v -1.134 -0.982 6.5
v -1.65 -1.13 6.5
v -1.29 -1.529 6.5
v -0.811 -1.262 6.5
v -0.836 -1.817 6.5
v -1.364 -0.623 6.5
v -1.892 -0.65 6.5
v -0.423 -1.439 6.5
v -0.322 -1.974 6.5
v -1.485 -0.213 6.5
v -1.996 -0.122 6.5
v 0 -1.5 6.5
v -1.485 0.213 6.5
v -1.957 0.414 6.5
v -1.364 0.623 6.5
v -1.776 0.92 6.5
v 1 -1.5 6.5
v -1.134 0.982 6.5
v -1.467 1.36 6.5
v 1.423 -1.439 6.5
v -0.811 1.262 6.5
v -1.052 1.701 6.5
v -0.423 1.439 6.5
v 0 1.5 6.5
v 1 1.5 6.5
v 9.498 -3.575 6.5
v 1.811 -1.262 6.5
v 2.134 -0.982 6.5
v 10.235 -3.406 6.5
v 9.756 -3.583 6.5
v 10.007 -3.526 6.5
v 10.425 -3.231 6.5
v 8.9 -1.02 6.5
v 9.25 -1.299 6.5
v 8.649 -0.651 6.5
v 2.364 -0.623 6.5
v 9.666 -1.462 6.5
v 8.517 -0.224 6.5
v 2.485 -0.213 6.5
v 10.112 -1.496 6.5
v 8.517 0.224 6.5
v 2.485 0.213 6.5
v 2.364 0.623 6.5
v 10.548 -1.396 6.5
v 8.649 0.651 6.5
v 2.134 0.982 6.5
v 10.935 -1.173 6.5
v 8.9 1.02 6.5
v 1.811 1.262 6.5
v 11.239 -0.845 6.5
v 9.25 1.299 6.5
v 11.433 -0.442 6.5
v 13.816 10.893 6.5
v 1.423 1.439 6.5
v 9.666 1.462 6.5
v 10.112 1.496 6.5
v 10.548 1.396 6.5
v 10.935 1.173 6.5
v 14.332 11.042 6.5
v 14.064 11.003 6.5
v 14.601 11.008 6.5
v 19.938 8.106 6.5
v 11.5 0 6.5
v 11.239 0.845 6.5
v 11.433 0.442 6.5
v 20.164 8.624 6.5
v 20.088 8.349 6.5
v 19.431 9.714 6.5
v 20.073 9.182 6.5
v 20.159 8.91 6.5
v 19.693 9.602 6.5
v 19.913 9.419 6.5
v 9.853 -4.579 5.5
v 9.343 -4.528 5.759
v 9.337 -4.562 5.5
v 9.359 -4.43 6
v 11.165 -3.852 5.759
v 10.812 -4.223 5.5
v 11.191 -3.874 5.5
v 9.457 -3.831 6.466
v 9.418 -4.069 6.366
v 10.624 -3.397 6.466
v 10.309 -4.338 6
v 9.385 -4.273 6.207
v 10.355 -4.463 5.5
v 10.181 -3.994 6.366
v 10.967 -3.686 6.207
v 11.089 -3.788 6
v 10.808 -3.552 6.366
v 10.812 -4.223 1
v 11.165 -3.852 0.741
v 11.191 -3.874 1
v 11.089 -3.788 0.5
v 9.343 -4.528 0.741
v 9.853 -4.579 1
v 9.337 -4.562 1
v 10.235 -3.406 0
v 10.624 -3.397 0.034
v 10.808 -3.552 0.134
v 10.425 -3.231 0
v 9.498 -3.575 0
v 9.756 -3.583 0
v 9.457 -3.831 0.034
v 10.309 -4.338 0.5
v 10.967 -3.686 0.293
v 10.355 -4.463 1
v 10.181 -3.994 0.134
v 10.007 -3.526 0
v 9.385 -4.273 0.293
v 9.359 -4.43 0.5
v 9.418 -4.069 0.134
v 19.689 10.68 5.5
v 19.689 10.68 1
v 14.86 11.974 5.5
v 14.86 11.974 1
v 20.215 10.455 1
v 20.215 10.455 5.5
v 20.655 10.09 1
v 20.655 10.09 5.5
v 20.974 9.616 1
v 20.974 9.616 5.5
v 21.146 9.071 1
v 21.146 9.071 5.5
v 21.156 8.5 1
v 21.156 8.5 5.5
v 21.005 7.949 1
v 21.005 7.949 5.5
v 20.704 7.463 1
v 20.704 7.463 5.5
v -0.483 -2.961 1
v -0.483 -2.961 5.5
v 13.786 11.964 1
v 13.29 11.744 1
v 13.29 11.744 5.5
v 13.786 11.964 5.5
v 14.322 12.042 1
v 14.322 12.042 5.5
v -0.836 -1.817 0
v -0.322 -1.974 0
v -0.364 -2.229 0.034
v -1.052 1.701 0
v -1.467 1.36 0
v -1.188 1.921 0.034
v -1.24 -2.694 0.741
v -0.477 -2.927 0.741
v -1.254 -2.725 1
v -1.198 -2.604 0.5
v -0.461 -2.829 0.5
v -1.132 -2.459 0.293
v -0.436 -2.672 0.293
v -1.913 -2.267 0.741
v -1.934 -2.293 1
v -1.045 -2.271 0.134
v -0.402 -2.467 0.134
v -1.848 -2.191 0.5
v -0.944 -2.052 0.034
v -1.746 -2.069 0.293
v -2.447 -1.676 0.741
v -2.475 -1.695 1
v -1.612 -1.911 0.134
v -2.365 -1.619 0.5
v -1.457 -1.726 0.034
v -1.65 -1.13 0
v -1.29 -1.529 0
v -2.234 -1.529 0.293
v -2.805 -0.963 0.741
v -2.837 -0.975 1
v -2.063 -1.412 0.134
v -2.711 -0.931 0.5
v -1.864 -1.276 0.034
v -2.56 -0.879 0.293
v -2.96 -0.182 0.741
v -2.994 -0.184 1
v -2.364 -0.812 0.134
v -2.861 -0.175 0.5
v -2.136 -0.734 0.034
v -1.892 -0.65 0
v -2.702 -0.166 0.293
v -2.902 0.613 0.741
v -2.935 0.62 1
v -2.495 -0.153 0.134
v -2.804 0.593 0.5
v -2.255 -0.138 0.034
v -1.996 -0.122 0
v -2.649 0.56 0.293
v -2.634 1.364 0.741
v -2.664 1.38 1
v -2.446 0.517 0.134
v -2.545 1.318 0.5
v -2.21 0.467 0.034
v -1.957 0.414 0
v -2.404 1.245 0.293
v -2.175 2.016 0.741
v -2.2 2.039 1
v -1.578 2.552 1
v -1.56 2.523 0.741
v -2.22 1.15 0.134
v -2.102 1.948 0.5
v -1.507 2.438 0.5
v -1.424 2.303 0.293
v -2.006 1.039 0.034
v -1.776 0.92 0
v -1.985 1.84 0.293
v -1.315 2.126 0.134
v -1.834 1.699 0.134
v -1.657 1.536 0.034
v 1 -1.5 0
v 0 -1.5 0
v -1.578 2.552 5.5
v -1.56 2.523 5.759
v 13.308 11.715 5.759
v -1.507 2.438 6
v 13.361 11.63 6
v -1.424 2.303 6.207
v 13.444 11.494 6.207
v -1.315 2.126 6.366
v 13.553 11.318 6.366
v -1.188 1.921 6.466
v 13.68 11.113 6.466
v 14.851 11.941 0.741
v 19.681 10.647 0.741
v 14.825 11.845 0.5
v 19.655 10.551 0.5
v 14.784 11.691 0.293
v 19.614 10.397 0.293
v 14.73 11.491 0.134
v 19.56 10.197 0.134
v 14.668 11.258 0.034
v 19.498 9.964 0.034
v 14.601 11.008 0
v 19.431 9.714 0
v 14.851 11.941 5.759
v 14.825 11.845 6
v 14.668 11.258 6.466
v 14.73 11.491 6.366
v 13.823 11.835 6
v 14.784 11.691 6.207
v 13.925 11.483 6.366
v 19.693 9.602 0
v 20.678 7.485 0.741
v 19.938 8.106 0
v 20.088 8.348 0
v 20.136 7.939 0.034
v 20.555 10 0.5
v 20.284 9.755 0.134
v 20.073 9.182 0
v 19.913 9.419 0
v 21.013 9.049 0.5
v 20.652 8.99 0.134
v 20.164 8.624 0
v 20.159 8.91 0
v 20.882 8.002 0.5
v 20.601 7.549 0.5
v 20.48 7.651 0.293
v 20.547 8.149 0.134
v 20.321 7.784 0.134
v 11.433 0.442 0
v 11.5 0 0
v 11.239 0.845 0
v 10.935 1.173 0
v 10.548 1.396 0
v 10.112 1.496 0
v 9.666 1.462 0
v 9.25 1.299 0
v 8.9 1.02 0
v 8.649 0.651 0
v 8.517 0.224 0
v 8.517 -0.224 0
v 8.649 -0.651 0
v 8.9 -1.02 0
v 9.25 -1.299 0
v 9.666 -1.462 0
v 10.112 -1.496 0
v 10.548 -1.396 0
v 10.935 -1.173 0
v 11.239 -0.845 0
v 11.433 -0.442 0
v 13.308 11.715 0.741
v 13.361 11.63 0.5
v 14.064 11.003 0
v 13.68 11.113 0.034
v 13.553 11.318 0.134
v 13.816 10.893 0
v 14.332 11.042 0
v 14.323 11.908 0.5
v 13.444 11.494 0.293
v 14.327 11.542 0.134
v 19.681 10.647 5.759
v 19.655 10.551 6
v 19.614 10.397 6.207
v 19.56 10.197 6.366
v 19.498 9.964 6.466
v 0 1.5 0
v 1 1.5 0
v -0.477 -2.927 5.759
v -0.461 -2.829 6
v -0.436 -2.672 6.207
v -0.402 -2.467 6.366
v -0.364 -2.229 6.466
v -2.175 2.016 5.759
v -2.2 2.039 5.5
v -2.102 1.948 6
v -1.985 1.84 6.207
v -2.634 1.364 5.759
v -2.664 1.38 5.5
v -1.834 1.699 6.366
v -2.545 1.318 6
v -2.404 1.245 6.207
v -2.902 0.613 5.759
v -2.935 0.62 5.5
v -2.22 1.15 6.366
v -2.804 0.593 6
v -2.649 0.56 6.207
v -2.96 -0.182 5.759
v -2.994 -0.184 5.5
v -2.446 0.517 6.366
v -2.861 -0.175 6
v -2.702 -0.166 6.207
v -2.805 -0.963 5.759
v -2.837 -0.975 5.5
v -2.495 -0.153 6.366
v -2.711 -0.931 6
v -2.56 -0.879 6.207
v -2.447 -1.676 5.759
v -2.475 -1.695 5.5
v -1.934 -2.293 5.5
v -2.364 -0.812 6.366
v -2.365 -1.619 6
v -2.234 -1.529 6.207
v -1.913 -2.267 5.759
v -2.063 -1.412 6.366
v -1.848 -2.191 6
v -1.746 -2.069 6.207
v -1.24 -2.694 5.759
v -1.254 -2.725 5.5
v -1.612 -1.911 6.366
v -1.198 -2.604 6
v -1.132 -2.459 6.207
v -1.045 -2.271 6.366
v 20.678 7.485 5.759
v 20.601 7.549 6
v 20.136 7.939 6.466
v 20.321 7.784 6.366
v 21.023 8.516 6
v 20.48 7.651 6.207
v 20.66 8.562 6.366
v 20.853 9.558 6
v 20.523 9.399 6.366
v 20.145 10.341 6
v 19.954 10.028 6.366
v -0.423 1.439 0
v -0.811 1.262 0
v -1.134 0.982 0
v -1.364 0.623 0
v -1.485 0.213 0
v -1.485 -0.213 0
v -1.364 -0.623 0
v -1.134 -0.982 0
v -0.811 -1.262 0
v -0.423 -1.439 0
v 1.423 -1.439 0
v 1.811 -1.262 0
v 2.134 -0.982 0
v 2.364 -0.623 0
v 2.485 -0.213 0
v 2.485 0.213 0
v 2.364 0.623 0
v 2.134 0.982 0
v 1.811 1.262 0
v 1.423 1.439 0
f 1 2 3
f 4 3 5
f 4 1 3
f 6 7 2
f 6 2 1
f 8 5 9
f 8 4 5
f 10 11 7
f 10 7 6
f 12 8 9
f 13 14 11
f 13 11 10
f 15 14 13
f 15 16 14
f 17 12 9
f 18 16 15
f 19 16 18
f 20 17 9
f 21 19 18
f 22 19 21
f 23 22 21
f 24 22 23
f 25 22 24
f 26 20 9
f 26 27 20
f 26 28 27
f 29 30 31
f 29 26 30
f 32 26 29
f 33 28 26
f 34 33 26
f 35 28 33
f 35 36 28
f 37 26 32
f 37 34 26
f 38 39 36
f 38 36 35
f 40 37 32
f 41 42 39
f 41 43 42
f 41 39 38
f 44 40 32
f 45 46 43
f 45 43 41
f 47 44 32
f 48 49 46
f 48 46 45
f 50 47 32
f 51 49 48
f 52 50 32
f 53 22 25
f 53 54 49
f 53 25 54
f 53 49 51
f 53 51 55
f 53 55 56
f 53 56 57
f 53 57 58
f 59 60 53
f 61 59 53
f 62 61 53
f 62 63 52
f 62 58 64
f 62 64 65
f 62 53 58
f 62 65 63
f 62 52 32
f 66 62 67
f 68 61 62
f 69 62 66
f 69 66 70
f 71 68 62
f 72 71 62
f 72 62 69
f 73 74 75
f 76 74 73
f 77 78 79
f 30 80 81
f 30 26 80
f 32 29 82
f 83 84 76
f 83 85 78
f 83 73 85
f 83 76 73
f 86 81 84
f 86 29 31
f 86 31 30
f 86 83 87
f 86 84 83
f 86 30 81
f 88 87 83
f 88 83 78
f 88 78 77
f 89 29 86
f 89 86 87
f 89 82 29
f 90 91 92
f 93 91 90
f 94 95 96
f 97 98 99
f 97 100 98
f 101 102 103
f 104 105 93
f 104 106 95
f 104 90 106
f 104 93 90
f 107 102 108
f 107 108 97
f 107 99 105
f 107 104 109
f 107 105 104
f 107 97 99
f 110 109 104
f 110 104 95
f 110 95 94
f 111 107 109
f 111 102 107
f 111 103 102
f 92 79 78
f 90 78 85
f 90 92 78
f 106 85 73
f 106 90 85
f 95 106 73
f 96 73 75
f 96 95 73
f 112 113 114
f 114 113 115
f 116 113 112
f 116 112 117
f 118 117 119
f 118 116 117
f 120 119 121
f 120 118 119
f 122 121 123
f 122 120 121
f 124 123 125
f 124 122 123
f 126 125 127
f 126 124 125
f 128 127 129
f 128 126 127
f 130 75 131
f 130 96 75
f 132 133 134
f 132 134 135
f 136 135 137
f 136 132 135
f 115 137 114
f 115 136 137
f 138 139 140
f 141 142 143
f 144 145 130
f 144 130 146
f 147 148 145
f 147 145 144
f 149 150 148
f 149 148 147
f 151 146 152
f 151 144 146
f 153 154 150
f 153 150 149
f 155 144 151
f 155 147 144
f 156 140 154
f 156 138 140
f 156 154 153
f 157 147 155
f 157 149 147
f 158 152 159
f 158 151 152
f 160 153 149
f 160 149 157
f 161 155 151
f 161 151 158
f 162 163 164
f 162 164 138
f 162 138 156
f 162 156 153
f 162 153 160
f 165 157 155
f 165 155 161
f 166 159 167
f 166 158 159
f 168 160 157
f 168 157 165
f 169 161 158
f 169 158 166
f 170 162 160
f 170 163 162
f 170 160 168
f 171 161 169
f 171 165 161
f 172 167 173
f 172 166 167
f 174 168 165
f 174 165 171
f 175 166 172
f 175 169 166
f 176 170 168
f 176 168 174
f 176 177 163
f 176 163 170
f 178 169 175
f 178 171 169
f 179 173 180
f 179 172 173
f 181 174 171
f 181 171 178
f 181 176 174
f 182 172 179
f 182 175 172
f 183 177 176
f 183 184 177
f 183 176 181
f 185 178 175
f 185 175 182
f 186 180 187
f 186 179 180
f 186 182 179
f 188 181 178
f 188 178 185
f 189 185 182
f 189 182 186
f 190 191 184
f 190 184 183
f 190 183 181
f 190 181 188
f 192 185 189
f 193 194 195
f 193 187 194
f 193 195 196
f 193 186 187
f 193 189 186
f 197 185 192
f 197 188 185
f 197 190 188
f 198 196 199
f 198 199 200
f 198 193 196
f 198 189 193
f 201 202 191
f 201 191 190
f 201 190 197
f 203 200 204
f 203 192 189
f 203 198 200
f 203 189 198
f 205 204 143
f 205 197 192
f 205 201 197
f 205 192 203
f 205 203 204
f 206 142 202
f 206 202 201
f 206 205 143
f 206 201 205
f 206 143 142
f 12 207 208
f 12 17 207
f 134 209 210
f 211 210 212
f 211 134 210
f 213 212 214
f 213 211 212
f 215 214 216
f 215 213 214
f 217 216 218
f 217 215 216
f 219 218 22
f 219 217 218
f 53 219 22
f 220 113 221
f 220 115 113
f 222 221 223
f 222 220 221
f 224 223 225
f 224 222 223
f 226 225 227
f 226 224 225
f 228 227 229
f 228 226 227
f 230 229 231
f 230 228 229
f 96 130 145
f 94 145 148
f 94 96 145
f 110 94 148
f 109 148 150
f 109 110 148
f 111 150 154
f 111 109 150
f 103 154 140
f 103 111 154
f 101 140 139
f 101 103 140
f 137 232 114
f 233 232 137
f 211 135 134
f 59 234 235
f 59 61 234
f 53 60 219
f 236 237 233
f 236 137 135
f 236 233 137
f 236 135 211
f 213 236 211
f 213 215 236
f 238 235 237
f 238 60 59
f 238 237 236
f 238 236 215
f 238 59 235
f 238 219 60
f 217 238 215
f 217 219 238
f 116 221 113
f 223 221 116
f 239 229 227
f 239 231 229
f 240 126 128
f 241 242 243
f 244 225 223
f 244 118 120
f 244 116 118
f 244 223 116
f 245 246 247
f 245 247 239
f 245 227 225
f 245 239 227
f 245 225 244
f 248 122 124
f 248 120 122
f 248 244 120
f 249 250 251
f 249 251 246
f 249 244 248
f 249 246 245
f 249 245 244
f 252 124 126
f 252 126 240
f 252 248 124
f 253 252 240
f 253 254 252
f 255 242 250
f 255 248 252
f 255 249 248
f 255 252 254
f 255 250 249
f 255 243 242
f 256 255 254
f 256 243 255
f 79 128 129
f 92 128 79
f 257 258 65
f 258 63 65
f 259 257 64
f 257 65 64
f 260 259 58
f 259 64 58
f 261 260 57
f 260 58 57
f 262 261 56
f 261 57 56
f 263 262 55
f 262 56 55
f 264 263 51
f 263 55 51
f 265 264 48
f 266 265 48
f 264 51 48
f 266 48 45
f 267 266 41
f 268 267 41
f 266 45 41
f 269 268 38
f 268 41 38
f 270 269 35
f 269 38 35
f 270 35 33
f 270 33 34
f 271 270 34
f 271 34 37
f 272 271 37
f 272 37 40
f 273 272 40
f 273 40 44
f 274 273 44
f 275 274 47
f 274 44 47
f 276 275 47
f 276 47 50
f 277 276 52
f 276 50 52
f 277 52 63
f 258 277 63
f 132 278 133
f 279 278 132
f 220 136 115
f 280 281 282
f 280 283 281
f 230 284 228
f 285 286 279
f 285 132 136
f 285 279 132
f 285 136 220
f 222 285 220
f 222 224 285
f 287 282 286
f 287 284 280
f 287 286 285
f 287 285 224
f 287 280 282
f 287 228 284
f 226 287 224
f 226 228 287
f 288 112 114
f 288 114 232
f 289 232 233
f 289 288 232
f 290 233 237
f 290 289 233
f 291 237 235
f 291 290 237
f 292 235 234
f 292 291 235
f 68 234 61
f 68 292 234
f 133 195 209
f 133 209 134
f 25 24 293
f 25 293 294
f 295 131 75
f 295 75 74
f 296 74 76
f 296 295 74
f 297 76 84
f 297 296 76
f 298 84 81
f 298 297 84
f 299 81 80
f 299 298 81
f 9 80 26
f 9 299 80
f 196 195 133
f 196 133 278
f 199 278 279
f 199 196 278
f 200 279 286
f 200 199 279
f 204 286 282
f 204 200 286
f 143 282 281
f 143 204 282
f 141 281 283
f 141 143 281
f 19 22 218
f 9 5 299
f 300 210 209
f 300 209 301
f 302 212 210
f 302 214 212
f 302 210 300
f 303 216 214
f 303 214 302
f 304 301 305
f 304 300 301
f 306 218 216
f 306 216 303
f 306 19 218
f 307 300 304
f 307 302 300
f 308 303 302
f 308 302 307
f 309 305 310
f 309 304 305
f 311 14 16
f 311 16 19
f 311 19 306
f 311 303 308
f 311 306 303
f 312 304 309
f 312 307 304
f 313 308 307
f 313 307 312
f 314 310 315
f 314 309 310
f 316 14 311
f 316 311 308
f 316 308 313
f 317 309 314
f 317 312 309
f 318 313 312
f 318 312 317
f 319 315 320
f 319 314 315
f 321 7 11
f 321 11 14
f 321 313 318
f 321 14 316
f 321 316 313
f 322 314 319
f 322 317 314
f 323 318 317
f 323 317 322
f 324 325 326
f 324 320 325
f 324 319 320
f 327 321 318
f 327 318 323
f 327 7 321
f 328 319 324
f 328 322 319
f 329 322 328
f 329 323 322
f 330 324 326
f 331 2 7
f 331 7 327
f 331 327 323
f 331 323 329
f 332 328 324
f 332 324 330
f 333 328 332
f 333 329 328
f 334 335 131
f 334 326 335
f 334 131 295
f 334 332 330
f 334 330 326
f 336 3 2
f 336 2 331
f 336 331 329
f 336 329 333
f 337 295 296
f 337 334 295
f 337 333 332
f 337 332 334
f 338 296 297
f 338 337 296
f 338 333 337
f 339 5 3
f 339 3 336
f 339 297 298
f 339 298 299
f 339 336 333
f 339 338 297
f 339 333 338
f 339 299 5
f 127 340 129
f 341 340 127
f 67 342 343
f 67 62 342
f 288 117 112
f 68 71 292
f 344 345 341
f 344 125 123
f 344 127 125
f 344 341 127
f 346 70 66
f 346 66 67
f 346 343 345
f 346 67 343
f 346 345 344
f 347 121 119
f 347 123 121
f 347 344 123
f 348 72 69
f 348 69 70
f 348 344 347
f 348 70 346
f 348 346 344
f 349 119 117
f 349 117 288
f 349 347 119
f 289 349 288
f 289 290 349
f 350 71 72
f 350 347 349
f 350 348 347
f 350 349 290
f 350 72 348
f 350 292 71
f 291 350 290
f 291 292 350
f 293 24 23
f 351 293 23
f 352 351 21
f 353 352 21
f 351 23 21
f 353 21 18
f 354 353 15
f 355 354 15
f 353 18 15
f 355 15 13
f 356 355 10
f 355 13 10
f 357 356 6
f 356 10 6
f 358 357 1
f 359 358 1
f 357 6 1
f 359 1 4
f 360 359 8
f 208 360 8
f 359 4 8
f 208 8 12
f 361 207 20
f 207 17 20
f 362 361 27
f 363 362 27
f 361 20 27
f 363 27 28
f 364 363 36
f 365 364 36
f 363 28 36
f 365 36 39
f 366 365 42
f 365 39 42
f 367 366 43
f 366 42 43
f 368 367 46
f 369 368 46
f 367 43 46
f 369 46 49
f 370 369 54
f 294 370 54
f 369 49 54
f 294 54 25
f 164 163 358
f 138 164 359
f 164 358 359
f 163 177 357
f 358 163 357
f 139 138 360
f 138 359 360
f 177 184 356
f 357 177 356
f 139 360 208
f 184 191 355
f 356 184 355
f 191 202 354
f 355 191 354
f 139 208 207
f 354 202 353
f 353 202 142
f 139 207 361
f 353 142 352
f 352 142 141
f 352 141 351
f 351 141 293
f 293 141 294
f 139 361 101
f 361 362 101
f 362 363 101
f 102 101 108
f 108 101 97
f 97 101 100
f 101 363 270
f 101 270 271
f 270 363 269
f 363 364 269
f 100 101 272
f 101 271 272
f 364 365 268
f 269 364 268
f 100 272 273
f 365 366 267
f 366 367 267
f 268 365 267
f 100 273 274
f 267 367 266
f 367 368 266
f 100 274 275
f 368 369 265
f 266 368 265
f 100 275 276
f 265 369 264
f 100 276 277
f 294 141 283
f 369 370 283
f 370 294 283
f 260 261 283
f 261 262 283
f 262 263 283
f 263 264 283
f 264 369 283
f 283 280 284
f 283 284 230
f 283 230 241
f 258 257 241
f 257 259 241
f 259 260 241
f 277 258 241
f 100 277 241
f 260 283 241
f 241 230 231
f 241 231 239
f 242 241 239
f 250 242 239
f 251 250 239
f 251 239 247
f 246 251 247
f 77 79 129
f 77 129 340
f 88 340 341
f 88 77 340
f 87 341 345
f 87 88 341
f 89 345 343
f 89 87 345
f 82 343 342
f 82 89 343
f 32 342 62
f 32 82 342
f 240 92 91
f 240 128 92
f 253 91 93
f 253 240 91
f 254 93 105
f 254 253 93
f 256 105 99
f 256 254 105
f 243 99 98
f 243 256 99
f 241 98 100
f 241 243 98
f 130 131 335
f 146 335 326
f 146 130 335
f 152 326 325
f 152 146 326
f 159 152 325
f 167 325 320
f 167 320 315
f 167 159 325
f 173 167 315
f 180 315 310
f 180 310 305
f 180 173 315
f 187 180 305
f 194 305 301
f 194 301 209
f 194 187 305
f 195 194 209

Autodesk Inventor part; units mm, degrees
ref_plane "YZ Plane" through (0, 0, 0) normal (1, 0, 0) x (0, 1, 0)
ref_plane "XZ Plane" through (0, 0, 0) normal (0, 1, 0) x (-1, 0, 0)
ref_plane "XY Plane" through (0, 0, 0) normal (0, 0, 1) x (1, 0, 0)
sketch "スケッチ1" plane through (0, 0, 0) normal (0, 0, 1) x (1, 0, 0)
  arc A0 (-1.5776, 2.5517) -> (-0.4828, -2.9609) centre (0, 0) ccw
  line L0 (-1.5776, 2.5517) -> (13.2904, 11.7436)
  line L1 (20.7039, 7.4628) -> (11.1913, -3.8738)
  line L2 (9.3374, -4.5621) -> (-0.4828, -2.9609)
  arc A1 (20.7039, 7.4628) -> (19.6894, 10.6802) centre (19.1718, 8.7484) ccw
  arc A2 (9.3374, -4.5621) -> (11.1913, -3.8738) centre (9.6593, -2.5882) ccw
  line L3 (0, 0) -> (9.6593, -2.5882)
  line L4 (9.6593, -2.5882) -> (19.1718, 8.7484)
  line L5 (-8.5052, 0) -> (26.6017, 0) projected
  line L6 (19.6894, 10.6802) -> (14.8598, 11.9743)
  arc A3 (14.8598, 11.9743) -> (13.2904, 11.7436) centre (14.3421, 10.0425) ccw
  line L7 (19.1718, 8.7484) -> (14.3421, 10.0425)
  line L8 (14.3421, 10.0425) -> (0, 0)
  dimension "d0" = 2
  dimension "d18" = 15
  dimension "d19" = 115
  dimension "d20" = 3
  dimension "d21" = 2
  dimension "d22" = 130
  dimension "d23" = 65
  dimension "d24" = 10
  dimension "d25" = 5
extrude "押し出し1" add sketch "スケッチ1" along normal blind 6.5
sketch "スケッチ3" plane through (0, 0, 6.5) normal (0, 0, 1) x (1, 0, 0)
  line L0 (0, 0) -> (1, 0) construction
  line L1 (0, 1.5) -> (1, 1.5)
  line L2 (1, -1.5) -> (0, -1.5)
  arc A0 (0, 1.5) -> (0, -1.5) centre (0, 0) ccw
  arc A1 (1, -1.5) -> (1, 1.5) centre (1, 0) ccw
  point P0 (0.5, 0)
  dimension "d7" = 3
  dimension "d8" = 1
extrude "押し出し3" cut sketch "スケッチ3" against normal through all
sketch "スケッチ5" plane through (0, 0, 6.5) normal (0, 0, 1) x (1, 0, 0)
  circle A0 centre (10, 0) radius 1.5
  line L0 (-7.8344, 0) -> (26.0061, 0) projected
  point P0 (0, 0)
  dimension "d14" = 3
  dimension "d15" = 10
extrude "押し出し5" cut sketch "スケッチ5" against normal through all
fillet "フィレット2" radius 1 16 edges at (-2.9425, -0.5844, 6.5) (4.4273, -3.7615, 6.5) (10.3554, -4.4631, 6.5) (15.9476, 1.7945, 6.5) (21.0792, 9.3498, 6.5) (17.2746, 11.3273, 6.5) (14.0513, 12.0212, 6.5) (5.8564, 7.1477, 6.5) (-2.9425, -0.5844, 0) (4.4273, -3.7615, 0) (10.3554, -4.4631, 0) (15.9476, 1.7945, 0) (21.0792, 9.3498, 0) (17.2746, 11.3273, 0) (14.0513, 12.0212, 0) (5.8564, 7.1477, 0)
properties part number "brake"
